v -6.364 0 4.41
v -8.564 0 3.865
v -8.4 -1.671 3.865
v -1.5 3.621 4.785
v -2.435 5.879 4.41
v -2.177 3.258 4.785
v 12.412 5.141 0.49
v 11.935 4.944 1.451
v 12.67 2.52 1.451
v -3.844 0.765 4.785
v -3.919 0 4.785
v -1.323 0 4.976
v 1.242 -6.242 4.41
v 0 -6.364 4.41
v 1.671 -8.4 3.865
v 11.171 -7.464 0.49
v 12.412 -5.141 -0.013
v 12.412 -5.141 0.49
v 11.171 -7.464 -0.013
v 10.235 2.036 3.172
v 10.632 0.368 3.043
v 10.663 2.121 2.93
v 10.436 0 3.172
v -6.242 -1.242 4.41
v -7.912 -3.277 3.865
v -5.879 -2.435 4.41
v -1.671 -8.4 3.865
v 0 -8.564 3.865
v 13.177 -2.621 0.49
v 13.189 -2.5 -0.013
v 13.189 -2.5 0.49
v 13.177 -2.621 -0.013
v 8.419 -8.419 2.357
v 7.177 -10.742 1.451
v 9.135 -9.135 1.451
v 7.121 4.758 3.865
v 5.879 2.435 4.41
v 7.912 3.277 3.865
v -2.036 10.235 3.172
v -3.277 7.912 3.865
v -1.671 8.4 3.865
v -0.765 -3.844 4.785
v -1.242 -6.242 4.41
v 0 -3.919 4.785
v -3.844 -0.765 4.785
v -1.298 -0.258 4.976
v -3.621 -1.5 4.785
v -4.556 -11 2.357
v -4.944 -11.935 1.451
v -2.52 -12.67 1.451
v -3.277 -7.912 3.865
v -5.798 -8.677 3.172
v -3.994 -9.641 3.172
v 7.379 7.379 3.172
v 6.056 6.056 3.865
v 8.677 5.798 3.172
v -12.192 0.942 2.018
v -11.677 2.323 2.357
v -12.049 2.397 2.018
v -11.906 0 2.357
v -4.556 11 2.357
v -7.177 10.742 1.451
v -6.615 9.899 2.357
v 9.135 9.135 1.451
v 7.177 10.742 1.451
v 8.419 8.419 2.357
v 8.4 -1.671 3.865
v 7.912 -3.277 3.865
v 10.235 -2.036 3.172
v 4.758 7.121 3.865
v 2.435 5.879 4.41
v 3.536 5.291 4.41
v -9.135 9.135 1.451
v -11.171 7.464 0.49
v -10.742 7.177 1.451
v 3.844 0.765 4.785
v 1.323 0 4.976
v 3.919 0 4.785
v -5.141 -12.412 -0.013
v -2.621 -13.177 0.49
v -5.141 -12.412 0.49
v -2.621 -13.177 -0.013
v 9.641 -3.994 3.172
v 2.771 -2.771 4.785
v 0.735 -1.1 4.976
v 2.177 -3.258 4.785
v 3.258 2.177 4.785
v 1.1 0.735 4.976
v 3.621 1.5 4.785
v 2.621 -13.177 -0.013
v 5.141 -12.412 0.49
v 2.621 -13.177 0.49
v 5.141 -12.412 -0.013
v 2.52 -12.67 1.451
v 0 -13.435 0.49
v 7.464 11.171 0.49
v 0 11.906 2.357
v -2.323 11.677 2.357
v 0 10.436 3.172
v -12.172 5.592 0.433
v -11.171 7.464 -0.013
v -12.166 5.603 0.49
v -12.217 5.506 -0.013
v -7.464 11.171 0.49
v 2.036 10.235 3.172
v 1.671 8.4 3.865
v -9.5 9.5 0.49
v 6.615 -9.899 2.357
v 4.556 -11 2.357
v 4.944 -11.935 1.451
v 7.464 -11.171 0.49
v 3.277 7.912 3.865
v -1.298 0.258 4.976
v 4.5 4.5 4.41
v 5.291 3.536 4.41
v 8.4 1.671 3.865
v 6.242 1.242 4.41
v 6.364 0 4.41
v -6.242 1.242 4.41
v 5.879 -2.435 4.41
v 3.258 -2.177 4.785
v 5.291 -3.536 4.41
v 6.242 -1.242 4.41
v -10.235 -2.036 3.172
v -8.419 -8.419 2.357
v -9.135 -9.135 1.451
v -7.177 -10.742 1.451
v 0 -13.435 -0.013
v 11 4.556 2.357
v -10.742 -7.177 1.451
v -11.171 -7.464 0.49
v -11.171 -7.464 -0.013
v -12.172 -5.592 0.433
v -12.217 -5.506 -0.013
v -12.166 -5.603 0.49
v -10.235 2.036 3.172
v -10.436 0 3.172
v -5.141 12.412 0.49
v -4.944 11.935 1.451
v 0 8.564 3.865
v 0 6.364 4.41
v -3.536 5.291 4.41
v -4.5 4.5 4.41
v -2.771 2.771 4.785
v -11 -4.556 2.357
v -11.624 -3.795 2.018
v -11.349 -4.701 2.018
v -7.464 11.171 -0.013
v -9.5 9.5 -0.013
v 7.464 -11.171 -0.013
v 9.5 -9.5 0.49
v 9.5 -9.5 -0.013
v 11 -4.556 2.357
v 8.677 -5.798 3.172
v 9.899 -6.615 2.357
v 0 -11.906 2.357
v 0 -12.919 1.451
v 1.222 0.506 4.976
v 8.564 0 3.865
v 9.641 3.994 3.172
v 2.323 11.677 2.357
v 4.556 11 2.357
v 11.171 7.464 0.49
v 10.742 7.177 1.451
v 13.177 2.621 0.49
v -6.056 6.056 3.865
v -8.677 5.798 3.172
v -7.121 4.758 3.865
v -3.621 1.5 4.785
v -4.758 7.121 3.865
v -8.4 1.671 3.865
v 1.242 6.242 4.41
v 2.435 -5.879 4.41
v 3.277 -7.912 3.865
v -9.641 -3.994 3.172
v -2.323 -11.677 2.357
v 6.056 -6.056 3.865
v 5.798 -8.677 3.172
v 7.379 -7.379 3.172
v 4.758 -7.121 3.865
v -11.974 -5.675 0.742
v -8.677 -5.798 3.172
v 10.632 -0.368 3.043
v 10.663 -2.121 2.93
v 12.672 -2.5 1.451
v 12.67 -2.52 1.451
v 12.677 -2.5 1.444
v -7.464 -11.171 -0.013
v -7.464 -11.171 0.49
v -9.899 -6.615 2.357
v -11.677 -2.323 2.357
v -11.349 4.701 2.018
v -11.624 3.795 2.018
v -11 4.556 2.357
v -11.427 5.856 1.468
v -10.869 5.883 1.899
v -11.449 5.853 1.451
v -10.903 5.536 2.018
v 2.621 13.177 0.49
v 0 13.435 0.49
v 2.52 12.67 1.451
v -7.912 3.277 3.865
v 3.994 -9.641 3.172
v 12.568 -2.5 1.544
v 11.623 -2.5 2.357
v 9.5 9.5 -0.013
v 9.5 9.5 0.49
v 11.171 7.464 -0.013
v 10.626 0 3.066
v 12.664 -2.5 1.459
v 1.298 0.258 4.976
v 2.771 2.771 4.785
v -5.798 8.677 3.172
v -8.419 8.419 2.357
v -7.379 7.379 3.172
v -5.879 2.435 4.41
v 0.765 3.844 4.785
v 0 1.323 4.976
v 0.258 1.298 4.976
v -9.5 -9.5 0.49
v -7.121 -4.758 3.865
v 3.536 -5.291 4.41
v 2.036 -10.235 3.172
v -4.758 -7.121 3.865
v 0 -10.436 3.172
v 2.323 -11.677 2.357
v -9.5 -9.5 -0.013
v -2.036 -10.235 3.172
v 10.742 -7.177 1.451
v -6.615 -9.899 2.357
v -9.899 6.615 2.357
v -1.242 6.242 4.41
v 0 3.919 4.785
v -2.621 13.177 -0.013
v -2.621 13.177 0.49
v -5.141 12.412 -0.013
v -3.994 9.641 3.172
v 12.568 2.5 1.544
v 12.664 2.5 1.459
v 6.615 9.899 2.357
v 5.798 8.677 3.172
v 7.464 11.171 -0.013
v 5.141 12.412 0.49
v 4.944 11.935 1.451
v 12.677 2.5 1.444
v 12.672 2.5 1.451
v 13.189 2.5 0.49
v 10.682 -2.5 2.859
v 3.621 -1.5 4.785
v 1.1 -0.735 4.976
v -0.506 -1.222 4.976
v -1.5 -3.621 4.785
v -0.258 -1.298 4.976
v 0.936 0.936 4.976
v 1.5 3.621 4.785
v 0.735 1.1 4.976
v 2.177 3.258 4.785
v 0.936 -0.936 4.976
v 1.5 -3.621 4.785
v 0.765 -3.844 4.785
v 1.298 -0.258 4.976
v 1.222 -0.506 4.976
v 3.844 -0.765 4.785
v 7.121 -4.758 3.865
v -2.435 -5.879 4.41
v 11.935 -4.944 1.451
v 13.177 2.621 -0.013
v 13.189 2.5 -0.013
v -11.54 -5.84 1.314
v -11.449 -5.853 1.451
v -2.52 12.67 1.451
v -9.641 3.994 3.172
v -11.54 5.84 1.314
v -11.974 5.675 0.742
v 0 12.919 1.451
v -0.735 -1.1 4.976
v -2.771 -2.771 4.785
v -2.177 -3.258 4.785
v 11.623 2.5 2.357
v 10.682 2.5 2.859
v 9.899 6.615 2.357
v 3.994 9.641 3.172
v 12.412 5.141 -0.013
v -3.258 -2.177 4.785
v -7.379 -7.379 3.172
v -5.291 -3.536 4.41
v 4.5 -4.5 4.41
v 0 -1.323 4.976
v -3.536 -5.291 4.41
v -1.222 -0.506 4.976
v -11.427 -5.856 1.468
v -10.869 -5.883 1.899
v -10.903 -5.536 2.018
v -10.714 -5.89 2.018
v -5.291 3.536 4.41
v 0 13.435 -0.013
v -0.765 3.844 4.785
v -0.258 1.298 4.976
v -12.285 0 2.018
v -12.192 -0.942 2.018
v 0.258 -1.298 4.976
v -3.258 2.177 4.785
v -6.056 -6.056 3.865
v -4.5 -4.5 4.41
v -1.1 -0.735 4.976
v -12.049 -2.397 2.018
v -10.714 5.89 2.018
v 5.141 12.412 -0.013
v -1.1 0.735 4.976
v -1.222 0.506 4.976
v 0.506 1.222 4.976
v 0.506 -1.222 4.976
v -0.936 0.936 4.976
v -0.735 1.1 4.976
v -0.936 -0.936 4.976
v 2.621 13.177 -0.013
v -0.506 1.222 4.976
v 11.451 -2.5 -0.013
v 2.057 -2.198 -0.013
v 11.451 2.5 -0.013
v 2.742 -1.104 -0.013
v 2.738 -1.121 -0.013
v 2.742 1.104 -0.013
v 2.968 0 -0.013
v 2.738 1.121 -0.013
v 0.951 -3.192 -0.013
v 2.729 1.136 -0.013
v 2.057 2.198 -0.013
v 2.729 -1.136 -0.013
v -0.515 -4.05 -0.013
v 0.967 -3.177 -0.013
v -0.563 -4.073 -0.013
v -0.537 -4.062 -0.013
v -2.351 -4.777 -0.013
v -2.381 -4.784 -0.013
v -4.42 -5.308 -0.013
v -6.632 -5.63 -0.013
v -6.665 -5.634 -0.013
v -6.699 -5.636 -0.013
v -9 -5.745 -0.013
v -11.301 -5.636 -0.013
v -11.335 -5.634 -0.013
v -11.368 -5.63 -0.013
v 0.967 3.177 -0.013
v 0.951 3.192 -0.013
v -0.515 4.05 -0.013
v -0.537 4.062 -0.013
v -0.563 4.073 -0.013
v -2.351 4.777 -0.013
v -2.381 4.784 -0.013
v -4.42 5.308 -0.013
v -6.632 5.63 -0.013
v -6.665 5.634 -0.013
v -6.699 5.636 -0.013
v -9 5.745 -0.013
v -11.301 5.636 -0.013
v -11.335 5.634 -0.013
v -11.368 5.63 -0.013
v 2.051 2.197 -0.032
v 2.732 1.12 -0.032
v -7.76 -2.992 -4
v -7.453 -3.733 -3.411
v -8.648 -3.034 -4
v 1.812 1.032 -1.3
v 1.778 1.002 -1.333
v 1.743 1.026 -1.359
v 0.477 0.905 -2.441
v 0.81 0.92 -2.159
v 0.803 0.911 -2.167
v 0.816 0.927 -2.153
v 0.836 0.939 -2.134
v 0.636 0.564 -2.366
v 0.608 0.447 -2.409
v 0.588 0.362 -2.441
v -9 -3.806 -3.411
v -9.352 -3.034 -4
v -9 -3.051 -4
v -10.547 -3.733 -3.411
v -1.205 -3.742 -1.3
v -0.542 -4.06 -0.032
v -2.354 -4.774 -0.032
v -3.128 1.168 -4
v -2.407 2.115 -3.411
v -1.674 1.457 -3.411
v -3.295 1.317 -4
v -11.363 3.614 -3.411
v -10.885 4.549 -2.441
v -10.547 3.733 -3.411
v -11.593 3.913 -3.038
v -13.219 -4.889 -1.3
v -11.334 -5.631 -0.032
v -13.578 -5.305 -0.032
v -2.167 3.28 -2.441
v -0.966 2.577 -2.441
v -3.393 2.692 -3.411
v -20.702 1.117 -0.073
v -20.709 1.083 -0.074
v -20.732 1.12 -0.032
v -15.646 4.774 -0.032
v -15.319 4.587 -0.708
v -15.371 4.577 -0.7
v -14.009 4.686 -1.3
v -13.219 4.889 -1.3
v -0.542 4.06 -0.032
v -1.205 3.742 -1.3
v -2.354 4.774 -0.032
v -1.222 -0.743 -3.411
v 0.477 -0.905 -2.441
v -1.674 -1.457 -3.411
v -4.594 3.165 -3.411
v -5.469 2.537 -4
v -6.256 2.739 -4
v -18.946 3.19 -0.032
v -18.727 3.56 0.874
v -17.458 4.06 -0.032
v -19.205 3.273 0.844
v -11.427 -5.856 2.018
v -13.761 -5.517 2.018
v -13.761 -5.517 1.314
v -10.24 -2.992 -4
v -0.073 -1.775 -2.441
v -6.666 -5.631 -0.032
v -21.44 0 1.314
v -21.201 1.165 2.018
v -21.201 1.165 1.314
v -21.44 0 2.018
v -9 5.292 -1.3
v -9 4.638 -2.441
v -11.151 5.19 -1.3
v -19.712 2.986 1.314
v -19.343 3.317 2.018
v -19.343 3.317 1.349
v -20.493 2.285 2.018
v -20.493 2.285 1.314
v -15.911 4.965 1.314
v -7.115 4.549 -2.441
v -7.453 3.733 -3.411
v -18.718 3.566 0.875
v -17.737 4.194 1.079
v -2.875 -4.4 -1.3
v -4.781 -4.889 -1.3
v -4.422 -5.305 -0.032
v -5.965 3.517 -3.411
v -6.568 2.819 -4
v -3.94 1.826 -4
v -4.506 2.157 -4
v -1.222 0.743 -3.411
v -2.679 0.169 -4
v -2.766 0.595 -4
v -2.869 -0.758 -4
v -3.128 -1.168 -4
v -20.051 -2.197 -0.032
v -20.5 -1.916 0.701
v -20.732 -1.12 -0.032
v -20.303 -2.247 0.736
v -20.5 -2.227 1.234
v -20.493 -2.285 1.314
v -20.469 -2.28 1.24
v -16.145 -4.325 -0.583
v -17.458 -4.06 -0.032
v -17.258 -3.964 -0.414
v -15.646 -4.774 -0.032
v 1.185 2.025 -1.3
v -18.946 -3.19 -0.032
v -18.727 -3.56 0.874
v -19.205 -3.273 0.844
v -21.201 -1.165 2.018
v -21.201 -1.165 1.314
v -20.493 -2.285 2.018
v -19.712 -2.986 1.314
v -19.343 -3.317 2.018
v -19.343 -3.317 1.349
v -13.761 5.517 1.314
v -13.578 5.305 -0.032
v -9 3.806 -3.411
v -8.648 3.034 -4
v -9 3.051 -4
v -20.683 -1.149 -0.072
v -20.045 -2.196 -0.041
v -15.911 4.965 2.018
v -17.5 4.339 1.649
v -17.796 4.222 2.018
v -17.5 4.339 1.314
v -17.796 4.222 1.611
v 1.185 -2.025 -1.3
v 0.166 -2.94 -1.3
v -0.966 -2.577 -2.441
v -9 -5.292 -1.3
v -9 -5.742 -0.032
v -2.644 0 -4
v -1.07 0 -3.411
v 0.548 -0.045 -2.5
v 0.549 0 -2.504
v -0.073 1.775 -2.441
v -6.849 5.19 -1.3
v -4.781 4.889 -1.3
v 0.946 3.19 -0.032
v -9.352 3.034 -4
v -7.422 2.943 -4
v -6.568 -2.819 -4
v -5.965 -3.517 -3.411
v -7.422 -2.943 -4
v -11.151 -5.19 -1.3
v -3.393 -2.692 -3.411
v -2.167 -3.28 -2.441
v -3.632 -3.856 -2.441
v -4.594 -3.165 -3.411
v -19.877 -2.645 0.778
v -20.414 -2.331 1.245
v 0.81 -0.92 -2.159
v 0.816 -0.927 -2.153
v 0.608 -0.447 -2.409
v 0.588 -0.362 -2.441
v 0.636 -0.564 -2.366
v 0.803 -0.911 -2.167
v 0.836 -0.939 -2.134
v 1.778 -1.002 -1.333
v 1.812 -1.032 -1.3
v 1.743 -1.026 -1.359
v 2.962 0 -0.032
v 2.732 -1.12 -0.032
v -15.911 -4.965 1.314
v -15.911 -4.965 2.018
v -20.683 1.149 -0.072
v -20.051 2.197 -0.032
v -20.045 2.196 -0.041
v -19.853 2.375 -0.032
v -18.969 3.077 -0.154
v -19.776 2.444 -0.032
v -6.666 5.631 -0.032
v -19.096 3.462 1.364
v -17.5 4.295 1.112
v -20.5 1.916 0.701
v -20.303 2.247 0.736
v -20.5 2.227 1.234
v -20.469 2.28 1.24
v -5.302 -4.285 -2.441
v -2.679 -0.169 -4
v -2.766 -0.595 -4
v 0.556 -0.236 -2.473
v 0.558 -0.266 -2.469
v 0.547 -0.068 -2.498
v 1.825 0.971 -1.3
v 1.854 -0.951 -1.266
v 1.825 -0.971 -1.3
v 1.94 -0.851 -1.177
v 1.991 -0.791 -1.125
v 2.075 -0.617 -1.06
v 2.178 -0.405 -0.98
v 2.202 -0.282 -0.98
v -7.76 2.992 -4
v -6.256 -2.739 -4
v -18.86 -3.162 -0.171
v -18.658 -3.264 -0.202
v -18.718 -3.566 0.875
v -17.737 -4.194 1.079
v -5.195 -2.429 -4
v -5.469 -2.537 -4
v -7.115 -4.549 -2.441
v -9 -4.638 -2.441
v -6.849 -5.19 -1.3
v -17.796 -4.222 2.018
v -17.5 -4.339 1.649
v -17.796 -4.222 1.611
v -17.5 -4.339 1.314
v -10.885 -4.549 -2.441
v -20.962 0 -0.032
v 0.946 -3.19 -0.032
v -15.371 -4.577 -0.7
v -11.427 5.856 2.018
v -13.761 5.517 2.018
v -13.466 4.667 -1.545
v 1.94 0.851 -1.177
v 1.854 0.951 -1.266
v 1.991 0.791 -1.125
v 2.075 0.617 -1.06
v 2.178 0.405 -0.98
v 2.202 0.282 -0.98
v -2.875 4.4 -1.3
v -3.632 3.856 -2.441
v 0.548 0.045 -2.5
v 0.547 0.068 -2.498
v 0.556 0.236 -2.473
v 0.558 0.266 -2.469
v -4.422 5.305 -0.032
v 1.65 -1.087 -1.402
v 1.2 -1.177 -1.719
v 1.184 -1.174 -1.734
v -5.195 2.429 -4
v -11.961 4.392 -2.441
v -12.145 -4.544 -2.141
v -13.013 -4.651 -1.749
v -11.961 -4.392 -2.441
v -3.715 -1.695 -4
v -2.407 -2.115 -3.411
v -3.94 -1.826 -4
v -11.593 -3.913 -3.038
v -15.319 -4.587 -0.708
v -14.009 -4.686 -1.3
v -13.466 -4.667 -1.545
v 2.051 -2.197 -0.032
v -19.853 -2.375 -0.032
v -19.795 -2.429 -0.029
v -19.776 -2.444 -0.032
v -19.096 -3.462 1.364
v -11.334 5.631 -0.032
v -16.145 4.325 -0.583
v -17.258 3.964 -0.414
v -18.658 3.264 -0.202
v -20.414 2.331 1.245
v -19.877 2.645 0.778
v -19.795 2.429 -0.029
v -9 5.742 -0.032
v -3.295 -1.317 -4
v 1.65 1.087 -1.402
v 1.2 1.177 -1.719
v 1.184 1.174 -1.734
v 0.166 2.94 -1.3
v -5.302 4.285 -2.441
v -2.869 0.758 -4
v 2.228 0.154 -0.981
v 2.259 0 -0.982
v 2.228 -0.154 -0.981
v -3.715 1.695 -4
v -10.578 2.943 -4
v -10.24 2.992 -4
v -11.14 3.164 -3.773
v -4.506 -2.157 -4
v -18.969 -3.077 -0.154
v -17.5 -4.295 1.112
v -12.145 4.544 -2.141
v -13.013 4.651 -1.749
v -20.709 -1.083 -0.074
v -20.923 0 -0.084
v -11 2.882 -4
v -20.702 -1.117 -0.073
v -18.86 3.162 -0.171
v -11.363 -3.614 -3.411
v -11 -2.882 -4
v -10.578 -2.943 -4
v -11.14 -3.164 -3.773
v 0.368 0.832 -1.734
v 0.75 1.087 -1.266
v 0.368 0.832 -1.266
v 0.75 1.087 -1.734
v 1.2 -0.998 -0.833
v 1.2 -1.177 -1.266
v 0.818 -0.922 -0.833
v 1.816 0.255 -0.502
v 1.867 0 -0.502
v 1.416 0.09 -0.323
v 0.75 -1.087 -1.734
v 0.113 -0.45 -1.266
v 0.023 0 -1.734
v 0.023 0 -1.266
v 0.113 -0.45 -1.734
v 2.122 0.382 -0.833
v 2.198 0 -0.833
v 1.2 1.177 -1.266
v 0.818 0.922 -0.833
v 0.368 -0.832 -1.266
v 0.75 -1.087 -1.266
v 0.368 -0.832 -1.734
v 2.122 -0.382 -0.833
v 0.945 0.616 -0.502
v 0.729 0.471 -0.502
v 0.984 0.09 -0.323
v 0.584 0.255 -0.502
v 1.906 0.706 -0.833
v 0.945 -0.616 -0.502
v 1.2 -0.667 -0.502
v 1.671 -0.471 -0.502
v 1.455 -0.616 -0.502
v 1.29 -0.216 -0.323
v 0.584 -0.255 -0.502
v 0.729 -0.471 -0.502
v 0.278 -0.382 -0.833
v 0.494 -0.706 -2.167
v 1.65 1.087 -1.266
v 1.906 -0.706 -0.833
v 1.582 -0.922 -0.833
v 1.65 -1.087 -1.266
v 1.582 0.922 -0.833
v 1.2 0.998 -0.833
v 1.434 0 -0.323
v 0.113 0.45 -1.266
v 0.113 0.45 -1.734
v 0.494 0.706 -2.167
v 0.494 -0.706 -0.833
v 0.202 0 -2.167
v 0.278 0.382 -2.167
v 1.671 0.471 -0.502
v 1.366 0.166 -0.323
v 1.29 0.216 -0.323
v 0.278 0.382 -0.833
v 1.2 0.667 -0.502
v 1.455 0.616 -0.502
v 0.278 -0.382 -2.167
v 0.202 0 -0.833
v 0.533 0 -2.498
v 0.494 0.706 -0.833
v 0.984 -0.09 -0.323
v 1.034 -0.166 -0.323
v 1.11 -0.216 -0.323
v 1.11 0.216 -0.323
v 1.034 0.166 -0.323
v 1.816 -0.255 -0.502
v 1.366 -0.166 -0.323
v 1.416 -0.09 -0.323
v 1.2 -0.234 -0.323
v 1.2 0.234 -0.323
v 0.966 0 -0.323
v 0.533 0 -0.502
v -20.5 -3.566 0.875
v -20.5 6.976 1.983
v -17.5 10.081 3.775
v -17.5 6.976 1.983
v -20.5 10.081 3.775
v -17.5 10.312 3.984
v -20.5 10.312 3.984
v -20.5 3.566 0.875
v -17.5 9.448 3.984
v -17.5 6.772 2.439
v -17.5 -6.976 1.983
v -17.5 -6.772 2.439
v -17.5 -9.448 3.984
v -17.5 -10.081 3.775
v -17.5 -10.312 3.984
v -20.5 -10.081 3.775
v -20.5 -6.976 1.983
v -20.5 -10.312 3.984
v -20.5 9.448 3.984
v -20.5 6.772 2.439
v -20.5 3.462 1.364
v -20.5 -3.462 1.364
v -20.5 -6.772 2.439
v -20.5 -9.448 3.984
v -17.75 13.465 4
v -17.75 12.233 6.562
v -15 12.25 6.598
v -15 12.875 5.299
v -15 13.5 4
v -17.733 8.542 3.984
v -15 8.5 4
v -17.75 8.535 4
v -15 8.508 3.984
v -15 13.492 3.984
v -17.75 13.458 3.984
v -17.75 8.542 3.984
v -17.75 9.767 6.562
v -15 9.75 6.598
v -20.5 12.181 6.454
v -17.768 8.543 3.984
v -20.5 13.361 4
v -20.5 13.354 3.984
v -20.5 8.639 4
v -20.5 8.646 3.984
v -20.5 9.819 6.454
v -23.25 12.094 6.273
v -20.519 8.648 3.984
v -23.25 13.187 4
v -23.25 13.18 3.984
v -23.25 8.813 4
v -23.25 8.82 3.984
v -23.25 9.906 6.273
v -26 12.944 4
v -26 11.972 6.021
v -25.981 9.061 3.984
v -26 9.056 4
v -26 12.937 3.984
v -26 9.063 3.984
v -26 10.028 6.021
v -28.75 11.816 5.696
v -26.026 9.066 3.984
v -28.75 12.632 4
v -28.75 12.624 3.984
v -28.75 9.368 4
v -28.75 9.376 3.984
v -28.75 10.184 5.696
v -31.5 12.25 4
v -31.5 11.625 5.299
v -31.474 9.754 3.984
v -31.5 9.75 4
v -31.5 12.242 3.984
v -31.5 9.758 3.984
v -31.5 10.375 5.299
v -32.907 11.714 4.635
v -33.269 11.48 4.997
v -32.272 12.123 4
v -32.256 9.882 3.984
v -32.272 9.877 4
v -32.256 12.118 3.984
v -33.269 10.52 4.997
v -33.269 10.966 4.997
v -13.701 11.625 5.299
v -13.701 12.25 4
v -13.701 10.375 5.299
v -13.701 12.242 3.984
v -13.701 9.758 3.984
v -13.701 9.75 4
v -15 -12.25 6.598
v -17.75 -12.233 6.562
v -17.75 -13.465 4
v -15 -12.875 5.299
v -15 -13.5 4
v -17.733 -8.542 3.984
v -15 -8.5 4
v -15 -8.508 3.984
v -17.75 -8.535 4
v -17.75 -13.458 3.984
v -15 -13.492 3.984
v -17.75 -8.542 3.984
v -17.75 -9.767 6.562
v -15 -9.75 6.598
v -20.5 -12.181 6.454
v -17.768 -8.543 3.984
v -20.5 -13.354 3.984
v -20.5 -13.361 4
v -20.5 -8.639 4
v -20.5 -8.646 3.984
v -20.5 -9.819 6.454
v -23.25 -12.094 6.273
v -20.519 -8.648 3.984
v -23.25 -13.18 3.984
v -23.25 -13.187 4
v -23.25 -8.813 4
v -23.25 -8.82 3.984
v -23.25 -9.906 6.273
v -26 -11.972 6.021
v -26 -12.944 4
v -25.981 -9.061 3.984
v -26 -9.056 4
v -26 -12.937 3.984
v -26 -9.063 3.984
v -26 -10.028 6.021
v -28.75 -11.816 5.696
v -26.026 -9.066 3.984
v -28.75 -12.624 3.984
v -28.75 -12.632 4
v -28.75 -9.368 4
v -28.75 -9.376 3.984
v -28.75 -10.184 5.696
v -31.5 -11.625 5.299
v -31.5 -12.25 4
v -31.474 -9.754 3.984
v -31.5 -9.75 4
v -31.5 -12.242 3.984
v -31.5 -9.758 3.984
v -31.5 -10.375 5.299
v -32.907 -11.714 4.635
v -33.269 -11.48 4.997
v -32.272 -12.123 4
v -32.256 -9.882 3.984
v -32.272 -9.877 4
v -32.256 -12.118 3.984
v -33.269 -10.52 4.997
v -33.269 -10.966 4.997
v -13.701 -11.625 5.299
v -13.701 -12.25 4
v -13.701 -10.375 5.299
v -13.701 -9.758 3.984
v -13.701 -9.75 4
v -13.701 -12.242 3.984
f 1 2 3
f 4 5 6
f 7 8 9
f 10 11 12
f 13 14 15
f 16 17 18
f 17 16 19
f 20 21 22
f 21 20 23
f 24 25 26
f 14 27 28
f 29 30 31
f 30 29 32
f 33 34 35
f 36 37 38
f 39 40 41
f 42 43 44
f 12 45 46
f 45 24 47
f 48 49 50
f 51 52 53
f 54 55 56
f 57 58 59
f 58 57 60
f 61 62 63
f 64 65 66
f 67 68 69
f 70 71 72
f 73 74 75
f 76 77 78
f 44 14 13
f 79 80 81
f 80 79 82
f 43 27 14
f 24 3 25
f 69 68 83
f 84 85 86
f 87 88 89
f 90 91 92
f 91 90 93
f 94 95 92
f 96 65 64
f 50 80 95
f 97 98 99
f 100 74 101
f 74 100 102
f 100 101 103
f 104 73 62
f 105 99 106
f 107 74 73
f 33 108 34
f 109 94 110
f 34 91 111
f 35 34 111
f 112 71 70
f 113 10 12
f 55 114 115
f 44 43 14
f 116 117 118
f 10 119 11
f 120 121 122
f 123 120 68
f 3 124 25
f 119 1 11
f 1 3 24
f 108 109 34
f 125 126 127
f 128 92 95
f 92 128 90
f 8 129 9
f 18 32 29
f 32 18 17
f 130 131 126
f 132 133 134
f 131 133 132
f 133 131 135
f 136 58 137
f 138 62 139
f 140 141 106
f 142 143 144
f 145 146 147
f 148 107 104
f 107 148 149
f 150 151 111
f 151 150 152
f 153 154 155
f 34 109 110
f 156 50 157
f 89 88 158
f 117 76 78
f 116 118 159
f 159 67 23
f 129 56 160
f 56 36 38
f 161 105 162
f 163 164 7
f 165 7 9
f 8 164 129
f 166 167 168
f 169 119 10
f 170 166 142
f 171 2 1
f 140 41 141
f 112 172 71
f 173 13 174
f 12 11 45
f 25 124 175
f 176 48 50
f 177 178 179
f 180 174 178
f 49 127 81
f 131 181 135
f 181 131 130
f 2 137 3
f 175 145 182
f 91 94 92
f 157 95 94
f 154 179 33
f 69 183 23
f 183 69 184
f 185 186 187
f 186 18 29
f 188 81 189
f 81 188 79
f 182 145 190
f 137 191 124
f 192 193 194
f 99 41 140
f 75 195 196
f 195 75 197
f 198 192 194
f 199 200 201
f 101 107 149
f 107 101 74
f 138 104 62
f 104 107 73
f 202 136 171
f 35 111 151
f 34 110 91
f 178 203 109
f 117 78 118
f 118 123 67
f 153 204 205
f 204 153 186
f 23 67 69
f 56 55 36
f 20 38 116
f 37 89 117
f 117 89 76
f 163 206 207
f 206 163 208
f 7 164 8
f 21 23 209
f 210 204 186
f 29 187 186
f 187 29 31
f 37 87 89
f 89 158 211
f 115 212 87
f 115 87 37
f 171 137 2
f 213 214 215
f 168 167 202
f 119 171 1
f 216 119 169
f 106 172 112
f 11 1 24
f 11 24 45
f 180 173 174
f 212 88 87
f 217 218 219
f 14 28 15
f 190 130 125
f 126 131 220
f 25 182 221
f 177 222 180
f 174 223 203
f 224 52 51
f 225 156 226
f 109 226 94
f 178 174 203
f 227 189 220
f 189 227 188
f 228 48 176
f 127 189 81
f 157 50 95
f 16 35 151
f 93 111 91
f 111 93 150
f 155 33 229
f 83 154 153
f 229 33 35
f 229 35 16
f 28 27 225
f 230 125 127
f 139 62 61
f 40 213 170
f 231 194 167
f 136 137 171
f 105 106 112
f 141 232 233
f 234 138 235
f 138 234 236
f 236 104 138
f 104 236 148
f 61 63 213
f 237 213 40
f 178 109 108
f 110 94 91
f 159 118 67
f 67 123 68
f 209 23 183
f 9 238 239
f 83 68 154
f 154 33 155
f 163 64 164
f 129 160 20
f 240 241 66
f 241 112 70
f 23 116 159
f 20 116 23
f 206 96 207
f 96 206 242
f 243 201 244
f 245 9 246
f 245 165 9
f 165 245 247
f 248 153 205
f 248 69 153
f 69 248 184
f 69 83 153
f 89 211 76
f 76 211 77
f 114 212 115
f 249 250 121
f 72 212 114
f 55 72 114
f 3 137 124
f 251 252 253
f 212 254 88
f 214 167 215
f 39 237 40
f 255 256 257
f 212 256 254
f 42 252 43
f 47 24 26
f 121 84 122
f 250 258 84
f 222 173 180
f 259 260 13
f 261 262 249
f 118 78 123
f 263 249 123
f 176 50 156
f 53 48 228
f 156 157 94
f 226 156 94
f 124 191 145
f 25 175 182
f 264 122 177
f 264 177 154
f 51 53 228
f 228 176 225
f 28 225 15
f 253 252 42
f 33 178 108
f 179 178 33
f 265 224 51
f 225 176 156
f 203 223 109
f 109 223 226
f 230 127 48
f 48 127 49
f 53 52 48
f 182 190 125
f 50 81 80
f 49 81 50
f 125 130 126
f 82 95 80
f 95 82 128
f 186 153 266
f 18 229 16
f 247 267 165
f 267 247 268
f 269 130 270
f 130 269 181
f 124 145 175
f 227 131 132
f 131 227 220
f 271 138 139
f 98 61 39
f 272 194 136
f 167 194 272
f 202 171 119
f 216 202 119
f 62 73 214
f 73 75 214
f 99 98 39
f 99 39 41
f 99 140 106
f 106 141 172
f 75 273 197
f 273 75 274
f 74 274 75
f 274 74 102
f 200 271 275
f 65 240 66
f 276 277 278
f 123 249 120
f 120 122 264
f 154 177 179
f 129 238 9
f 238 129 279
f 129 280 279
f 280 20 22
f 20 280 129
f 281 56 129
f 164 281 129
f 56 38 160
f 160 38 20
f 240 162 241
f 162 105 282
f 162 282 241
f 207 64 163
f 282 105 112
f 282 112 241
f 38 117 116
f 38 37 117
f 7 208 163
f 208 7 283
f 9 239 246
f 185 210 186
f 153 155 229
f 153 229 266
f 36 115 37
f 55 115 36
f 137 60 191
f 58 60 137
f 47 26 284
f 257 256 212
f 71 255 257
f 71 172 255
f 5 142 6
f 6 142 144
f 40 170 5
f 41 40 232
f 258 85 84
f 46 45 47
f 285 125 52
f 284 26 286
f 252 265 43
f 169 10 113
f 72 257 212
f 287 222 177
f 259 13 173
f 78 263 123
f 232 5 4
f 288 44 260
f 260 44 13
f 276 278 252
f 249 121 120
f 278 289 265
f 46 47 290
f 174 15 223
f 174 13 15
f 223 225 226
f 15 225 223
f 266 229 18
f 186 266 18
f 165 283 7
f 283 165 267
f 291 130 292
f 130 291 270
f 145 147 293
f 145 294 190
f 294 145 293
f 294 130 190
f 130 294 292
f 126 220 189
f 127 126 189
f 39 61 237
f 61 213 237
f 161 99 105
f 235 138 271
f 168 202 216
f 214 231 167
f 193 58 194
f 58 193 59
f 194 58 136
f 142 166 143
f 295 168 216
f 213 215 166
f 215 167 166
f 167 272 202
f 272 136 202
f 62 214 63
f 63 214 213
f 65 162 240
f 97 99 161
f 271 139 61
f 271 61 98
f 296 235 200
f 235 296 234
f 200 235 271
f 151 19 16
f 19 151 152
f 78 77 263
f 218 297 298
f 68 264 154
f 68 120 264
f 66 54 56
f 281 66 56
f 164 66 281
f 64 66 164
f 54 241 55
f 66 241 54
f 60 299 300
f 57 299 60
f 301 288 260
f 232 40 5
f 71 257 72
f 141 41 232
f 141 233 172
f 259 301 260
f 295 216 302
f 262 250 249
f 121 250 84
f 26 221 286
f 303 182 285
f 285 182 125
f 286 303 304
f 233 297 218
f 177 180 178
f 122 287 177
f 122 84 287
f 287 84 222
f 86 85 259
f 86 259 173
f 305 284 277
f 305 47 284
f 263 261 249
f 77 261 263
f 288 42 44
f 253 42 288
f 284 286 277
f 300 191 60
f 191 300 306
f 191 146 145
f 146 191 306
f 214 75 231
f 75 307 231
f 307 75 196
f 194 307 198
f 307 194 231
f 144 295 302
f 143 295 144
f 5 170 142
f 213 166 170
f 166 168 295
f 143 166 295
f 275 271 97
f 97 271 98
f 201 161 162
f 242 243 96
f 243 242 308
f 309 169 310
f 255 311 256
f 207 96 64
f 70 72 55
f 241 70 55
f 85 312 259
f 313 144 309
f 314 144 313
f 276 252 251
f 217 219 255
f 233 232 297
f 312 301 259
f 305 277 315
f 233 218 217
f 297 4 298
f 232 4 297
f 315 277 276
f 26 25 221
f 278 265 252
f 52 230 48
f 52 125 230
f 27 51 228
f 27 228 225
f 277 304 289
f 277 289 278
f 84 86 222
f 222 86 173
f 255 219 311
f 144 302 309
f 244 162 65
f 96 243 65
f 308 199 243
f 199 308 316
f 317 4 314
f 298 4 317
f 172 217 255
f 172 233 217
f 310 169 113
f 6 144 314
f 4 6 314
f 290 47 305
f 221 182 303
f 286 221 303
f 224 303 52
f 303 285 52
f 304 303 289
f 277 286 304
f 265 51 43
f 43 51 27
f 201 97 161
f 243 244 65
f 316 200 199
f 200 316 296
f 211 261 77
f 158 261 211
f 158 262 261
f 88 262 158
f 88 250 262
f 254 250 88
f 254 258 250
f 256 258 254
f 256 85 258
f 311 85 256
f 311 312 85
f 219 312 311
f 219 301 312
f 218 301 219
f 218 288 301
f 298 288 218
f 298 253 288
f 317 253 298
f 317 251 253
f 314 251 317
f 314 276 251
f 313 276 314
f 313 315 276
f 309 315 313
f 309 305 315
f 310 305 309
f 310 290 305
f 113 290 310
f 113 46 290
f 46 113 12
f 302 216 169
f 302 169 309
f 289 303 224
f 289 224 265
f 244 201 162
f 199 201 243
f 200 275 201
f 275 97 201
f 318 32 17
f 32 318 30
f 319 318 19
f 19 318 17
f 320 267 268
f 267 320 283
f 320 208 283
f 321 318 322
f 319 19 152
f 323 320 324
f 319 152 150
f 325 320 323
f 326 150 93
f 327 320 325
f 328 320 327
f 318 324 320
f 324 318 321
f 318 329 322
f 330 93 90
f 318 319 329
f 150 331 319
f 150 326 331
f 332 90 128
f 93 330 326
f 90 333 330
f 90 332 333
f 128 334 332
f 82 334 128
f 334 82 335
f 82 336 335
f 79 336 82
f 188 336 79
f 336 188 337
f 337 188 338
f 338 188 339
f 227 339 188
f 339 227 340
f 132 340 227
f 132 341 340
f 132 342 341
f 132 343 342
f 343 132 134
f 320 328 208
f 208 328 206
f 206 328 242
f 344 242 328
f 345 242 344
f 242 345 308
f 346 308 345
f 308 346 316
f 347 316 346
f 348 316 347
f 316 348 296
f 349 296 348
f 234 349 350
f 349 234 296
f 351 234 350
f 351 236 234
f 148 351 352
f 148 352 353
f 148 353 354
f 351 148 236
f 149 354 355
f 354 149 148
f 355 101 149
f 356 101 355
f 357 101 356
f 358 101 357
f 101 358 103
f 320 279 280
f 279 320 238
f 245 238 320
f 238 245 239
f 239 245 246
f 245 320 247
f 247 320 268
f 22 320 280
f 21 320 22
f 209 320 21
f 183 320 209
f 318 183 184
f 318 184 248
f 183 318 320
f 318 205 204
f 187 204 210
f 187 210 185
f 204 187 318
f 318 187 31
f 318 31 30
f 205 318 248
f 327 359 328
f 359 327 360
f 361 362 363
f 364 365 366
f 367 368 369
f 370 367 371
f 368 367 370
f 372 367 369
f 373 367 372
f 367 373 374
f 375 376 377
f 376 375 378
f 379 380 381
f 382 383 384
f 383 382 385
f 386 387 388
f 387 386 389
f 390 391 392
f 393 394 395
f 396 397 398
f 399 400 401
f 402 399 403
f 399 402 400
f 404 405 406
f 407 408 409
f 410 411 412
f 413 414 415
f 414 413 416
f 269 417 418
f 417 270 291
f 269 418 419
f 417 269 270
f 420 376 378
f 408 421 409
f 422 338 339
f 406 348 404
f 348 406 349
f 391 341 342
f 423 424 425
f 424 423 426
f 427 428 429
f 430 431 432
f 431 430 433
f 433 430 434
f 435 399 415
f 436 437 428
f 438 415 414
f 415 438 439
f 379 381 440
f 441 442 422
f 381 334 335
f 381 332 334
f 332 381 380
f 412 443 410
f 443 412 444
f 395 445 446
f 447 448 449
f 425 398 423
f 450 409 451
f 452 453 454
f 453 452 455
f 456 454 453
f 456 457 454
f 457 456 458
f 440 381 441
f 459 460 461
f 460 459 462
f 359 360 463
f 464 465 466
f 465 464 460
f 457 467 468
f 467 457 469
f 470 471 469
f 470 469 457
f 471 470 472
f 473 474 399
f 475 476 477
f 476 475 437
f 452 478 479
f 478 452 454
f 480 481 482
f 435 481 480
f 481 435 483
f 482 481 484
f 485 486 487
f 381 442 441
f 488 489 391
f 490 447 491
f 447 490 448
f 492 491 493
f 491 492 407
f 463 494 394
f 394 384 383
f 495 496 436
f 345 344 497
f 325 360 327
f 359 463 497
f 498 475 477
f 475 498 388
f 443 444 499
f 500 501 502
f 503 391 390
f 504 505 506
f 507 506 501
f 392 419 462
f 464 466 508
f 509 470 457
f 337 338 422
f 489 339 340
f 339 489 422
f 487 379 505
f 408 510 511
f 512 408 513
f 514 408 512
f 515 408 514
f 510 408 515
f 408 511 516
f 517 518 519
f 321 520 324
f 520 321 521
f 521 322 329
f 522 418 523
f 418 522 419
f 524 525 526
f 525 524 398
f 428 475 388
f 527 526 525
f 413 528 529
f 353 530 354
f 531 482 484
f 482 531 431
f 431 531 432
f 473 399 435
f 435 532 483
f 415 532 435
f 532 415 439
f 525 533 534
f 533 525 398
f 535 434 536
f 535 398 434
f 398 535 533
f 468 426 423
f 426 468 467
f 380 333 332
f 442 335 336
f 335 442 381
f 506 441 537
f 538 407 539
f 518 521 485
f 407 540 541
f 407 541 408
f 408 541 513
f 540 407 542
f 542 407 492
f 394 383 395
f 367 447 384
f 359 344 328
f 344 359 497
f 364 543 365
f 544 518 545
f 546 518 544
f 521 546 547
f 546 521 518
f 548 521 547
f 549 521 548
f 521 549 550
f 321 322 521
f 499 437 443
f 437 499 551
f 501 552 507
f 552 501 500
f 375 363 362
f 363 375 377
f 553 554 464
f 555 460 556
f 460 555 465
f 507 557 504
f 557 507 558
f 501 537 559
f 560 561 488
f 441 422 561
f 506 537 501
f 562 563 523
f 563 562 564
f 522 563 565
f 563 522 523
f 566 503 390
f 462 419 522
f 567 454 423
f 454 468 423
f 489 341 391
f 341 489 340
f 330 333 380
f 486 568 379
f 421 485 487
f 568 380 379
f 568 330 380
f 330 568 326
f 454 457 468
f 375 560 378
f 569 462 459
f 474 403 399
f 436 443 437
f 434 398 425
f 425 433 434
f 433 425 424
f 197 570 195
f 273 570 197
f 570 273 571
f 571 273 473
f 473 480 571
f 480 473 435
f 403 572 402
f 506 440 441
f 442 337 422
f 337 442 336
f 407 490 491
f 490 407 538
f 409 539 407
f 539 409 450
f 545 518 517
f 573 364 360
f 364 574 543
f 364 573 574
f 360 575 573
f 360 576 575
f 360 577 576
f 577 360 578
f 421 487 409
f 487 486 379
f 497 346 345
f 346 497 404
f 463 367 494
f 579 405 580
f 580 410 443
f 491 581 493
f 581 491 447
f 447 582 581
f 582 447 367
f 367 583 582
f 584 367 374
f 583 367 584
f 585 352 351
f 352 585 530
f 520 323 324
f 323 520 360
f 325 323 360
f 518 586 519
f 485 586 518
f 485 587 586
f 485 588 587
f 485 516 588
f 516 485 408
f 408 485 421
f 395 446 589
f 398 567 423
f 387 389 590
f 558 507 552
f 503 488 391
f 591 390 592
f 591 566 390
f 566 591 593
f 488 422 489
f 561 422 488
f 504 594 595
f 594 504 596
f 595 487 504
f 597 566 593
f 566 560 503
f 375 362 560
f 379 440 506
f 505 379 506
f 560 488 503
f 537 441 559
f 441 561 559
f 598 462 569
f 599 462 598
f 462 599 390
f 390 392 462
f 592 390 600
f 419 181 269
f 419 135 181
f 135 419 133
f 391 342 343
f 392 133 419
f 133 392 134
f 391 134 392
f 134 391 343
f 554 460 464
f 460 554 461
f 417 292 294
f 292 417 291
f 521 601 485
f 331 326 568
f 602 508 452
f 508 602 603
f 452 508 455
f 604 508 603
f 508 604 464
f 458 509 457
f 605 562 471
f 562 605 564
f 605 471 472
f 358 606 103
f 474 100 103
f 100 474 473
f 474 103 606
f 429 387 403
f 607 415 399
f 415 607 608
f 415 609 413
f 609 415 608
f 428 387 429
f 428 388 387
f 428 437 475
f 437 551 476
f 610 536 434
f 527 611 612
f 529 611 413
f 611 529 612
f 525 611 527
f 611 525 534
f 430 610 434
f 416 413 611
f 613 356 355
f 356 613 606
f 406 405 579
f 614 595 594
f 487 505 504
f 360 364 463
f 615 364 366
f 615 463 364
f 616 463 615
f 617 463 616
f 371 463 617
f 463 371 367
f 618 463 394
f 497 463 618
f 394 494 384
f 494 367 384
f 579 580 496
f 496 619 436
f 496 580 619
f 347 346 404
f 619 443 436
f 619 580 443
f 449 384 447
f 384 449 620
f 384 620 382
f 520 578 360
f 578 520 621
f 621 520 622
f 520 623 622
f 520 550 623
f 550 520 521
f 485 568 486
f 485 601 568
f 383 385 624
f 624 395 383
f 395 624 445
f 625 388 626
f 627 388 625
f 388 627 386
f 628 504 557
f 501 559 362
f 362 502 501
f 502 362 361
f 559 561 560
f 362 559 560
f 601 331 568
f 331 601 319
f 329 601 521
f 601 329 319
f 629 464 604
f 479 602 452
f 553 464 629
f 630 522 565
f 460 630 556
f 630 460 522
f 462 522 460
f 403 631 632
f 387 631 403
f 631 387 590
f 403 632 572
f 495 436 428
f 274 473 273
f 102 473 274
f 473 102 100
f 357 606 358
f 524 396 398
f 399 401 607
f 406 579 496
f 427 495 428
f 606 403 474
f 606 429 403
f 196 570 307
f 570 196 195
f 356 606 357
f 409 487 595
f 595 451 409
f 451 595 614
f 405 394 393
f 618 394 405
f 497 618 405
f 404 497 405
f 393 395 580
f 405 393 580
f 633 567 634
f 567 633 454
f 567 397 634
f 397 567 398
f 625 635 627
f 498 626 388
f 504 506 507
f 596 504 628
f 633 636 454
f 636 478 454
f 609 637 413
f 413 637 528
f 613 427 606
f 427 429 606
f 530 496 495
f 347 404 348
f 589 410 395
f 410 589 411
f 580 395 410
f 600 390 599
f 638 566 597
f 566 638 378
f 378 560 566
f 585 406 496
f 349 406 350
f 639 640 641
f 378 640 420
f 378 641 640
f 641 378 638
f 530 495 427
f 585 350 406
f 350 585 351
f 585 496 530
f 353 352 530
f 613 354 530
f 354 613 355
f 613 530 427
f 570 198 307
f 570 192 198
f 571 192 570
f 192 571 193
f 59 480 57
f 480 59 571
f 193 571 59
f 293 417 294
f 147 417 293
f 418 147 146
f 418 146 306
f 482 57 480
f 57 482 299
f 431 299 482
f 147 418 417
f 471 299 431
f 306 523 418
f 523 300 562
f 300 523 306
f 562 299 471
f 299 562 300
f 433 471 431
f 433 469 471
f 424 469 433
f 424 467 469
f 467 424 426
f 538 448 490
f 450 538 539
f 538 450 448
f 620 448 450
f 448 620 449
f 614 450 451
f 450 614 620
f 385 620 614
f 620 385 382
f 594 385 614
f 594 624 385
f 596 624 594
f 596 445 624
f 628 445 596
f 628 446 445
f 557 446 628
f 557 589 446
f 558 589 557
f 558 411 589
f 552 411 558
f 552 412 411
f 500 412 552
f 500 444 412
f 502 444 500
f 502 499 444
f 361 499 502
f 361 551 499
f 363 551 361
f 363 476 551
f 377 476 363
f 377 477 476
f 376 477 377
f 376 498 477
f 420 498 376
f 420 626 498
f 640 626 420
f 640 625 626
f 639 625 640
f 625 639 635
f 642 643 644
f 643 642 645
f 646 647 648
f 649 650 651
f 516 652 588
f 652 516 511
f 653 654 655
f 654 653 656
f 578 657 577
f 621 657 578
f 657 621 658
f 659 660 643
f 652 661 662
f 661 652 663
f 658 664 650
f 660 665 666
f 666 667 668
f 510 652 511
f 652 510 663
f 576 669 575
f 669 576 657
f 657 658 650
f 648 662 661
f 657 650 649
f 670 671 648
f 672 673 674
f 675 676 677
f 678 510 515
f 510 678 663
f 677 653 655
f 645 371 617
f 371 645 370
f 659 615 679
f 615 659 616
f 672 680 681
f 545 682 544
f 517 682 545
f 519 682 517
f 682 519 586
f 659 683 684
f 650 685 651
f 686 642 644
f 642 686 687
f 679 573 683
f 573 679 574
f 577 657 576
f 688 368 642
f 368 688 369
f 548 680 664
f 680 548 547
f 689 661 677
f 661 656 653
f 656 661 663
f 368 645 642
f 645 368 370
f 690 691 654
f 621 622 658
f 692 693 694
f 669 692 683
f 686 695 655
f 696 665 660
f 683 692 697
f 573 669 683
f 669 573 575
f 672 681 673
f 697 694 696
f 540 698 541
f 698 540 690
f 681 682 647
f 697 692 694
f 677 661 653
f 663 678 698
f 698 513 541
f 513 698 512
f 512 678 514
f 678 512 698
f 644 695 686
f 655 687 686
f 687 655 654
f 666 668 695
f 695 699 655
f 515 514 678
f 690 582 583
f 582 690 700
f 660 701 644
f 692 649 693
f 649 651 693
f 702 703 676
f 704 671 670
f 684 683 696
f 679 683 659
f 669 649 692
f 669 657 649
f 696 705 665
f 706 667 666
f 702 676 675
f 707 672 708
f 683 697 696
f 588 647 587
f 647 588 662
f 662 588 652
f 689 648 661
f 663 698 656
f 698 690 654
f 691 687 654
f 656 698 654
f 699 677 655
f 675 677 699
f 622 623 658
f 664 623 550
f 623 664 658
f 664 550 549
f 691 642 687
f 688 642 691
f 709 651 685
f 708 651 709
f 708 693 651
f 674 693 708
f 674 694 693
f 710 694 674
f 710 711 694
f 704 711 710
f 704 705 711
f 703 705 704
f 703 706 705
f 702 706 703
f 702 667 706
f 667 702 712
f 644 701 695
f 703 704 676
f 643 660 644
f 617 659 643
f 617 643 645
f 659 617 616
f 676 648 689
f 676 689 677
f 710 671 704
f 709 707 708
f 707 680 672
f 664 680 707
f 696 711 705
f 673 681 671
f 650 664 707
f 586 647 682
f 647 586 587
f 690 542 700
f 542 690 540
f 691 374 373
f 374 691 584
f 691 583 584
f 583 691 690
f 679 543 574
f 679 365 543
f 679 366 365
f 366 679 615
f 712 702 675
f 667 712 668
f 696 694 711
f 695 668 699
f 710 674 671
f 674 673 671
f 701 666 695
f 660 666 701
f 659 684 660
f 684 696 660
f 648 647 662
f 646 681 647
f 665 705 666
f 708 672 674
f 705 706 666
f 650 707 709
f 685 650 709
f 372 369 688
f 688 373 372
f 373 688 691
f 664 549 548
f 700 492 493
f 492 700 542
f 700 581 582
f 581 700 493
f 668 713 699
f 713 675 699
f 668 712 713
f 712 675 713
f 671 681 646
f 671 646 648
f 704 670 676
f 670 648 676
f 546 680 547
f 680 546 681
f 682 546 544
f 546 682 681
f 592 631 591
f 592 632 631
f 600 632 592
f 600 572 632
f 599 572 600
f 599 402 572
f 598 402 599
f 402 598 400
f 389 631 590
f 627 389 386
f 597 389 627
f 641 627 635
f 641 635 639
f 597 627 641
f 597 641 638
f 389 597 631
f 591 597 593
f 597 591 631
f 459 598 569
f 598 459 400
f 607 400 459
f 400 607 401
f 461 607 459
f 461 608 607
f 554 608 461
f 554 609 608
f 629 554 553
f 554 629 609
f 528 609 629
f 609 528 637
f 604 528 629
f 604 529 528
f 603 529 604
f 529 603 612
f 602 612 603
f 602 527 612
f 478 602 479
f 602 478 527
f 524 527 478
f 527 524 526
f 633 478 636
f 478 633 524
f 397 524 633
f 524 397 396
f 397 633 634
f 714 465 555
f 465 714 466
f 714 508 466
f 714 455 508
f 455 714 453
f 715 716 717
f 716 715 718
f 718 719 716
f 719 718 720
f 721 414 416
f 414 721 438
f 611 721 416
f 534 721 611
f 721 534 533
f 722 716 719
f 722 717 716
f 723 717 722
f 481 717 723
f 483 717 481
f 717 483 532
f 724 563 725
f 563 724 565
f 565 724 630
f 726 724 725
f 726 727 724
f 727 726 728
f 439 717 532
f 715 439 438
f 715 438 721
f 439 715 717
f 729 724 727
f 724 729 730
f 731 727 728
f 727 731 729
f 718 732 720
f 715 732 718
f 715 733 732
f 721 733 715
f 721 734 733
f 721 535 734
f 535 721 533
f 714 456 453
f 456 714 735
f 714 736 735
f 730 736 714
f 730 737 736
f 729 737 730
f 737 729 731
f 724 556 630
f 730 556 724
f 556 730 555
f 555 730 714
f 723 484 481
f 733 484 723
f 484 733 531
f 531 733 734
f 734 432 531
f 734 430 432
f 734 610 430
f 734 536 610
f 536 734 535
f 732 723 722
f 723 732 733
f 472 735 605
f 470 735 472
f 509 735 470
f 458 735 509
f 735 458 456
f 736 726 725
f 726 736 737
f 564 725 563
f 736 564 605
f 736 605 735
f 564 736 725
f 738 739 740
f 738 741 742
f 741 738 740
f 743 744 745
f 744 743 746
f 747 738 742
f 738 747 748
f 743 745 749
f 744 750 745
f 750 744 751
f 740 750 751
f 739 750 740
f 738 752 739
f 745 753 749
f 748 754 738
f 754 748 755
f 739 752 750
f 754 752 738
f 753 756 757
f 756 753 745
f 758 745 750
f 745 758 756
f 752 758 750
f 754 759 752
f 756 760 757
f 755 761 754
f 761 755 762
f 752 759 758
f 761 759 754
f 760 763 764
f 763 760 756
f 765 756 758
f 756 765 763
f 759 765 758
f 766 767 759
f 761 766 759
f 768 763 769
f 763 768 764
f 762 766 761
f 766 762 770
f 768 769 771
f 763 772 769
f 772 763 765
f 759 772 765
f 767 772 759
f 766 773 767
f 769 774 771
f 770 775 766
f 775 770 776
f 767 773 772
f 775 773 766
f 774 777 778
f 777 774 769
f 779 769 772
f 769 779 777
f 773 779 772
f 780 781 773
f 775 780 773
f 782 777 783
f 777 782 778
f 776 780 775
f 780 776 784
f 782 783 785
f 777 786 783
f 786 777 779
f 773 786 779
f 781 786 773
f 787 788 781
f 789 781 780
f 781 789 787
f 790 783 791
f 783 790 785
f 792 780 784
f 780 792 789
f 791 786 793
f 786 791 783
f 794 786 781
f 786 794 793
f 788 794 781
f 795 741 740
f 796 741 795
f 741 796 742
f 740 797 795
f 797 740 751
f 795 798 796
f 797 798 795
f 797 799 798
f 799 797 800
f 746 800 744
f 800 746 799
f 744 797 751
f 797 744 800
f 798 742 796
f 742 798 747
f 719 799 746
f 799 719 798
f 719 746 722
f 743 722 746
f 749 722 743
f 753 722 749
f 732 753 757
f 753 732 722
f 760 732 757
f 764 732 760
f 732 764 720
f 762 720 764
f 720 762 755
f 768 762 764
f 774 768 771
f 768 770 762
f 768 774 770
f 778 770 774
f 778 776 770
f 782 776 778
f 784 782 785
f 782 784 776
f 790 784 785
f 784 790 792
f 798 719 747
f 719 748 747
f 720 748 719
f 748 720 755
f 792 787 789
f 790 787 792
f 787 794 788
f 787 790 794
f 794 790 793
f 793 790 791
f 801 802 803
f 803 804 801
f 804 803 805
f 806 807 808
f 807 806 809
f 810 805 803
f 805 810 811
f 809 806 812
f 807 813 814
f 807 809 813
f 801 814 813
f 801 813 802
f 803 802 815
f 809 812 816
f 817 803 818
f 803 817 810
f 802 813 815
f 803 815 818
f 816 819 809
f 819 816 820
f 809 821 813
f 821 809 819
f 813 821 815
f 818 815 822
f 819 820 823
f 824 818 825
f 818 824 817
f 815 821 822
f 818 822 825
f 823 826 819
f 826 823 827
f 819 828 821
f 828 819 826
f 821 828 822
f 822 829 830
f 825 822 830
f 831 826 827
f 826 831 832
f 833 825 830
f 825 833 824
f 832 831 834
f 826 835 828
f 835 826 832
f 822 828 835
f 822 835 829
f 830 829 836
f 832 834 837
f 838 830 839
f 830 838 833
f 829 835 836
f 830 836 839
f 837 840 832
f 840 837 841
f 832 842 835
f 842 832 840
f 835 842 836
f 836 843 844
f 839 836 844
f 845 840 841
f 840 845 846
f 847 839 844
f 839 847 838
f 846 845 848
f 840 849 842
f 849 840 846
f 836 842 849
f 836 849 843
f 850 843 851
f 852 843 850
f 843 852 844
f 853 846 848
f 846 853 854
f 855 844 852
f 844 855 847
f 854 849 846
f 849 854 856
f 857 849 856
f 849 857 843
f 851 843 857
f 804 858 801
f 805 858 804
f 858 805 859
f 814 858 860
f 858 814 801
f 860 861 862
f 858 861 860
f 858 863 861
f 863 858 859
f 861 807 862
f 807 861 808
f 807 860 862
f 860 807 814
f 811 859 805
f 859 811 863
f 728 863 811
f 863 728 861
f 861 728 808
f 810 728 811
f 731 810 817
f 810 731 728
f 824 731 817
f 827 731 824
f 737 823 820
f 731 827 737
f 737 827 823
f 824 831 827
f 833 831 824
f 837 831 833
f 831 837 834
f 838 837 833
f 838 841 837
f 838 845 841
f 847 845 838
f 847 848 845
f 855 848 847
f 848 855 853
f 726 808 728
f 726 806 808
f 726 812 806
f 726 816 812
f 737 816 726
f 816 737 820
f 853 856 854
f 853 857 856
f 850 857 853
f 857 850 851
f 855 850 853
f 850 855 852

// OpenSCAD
// file: util.scad
fn1 = 32;
fn2 = 16;

module util_half_sphere(radius, fn=fn1) {
    difference() {
        sphere(radius, $fn=fn);
        translate([0,0,-(radius+radius/19)])
            cube(2*radius+radius/10, center=true);
    }
}

function gcd(a,b) = a == b ? a : a > b ? gcd(a-b, b) : gcd(a, b-a);

module util_saucer(length, width, height, fn=fn1) {
    rad = gcd(length,gcd(width,height));
    //rad = 10;
    scale([length/(2*rad), width/(2*rad), height/rad])
        util_half_sphere(rad, fn);
}

module util_half_cylinder(length, radius, inner_fn=fn2, outer_fn=fn1) {
    maxval = max(length, 2*radius);
    intersection() {
        difference() {
            rotate([0,90,0])
                translate([0,0,-(length/2 + length/20)])
                    cylinder(length+length/10, radius, radius, $fn=inner_fn);
            
            translate([0,0,(maxval/2 + maxval/19)])
                cube(maxval+maxval/10, center=true);
        }
        
        translate([0,0,-(radius+radius/20)])
            cylinder(radius + radius/10, length/2, length/2, $fn=outer_fn);
    }
}

module util_body(length, width, height, upper_height, fn=fn1) {
    rad = gcd(length, gcd(width, upper_height));
    
    scale(.995) scale([length/(2*rad), width/(2*rad), 1])
        util_half_cylinder(2*rad, height, outer_fn=fn);
}

module util_graded_cylinder(height, radius_start, radius_end, grades=1, fn=fn1) {
    height_grade = height / grades;
    radius_grade = (radius_start - radius_end) / (grades * grades);
    for (i = [0 : 1 : grades]) {
        translate([0,0,i*height_grade])
            cylinder(height_grade, 
                     radius_start - i*radius_grade * i,
                     radius_start - (i+1) * radius_grade * (i+1),
                     $fn = fn);
    }
}

module util_nacelle(length, width, height, curved=false, up=true, front_bulge=false) {
    rad = min(width, height/2);
    grads = curved ? 6 : 1;
    scale_factor = front_bulge ? 1.1 : 1;
    direction = up ? -1 : 1;
    difference() {
        scale([1, width/ (2*rad), height/rad])
            difference() {
                union() {
                    rotate([0,-90,0])
                        rotate(30)
                            util_graded_cylinder(length-rad, rad, rad/2, grads, 6);
                    scale(scale_factor) 
                        rotate([0,90,0]) rotate(90) sphere(rad, $fn=6);
                }
                
                translate([-length/2, 0, direction * (height/2 + height/19)])
                    cube([length+length, width+width, height+height/10], center=true);
            }
        
        translate([-length-(curved?length/3:0), 0, -length/3])
            rotate([0,-45,0])
                cube(length, center=true);
    }
}

module util_mirrored(v) {
    children();
    mirror(v) children();
}

module util_ring(outer, inner, height) {
    difference() {
        translate([0,0,-height/2])
            cylinder(height, outer, outer);
        translate([0,0,-(height/2 + height/19)])
            cylinder(height+height/10, inner, inner);
    }
}

module util_star(radius, thick, num, half=false) {
    angle = 360/num;
    offset = half? angle/2 : 0;
    for (i = [0: 1: num]) {
        rotate(i* angle + offset)
            translate([radius/2,0,0])
                cube([radius, thick, thick], center=true);
    }
}

module util_hangar_disk(height, lower, upper, num, fn=fn1) {
    difference() {
            cylinder(height, lower, upper, $fn=fn, center=true);
        difference() {
            scale([1,1,22])
                util_star(1.1*upper, height/20, num, half=true);
            scale(.95)
                cylinder(height, lower, upper, $fn=fn, center=true);
        }
    }
}

module util_nacelle_bar(span, height, width, thickness) {
    rad = (span*span/(8*height) + height/2);
    outer = rad + thickness/2;
    inner = rad - thickness/2;
    difference(){
        translate([0,0,outer])
            rotate([0,90,0])
                util_ring(outer, inner, width);
    
        translate([0,0,1.1*outer+height])
            cube(2.2*outer, center=true);
    }
}
// main file
use <util.scad>;

module dip_saucer() {
    difference() {
        util_saucer(27,27,5);
        //dip_body();
        translate([13.5,0,2]) 
            rotate([0,-15,0])
            cube(5, center=true);
    }
    
}

module dip_body() {
    difference() {
        translate([-9,0,2])
            mirror([0,0,1])
                util_saucer(25,12,7);
        
        union() {
            translate([-9,0,-13])
                cube(18, center=true);
            
            translate([1.2,0,-1.5])
                sphere(1.2, $fn=16);
            
            translate([-21,0,-4])
                scale([2.5,1,1])
                rotate([90,0,0])
                    cylinder(12,4,4, center=true);
        }
    }
}


module dip_nacelle_assembly() {
    translate([-19,0,0.5])
        util_nacelle_bar(24,5,3,.5);
    
    util_mirrored([0,1,0])
        translate([-15,11,4])
            util_nacelle(18,5,3,curved=true);
}

module dip_main() {
    dip_saucer();
    dip_body();
    dip_nacelle_assembly();
}

module diplomat() {
    scale(1) dip_main();
}

diplomat();
